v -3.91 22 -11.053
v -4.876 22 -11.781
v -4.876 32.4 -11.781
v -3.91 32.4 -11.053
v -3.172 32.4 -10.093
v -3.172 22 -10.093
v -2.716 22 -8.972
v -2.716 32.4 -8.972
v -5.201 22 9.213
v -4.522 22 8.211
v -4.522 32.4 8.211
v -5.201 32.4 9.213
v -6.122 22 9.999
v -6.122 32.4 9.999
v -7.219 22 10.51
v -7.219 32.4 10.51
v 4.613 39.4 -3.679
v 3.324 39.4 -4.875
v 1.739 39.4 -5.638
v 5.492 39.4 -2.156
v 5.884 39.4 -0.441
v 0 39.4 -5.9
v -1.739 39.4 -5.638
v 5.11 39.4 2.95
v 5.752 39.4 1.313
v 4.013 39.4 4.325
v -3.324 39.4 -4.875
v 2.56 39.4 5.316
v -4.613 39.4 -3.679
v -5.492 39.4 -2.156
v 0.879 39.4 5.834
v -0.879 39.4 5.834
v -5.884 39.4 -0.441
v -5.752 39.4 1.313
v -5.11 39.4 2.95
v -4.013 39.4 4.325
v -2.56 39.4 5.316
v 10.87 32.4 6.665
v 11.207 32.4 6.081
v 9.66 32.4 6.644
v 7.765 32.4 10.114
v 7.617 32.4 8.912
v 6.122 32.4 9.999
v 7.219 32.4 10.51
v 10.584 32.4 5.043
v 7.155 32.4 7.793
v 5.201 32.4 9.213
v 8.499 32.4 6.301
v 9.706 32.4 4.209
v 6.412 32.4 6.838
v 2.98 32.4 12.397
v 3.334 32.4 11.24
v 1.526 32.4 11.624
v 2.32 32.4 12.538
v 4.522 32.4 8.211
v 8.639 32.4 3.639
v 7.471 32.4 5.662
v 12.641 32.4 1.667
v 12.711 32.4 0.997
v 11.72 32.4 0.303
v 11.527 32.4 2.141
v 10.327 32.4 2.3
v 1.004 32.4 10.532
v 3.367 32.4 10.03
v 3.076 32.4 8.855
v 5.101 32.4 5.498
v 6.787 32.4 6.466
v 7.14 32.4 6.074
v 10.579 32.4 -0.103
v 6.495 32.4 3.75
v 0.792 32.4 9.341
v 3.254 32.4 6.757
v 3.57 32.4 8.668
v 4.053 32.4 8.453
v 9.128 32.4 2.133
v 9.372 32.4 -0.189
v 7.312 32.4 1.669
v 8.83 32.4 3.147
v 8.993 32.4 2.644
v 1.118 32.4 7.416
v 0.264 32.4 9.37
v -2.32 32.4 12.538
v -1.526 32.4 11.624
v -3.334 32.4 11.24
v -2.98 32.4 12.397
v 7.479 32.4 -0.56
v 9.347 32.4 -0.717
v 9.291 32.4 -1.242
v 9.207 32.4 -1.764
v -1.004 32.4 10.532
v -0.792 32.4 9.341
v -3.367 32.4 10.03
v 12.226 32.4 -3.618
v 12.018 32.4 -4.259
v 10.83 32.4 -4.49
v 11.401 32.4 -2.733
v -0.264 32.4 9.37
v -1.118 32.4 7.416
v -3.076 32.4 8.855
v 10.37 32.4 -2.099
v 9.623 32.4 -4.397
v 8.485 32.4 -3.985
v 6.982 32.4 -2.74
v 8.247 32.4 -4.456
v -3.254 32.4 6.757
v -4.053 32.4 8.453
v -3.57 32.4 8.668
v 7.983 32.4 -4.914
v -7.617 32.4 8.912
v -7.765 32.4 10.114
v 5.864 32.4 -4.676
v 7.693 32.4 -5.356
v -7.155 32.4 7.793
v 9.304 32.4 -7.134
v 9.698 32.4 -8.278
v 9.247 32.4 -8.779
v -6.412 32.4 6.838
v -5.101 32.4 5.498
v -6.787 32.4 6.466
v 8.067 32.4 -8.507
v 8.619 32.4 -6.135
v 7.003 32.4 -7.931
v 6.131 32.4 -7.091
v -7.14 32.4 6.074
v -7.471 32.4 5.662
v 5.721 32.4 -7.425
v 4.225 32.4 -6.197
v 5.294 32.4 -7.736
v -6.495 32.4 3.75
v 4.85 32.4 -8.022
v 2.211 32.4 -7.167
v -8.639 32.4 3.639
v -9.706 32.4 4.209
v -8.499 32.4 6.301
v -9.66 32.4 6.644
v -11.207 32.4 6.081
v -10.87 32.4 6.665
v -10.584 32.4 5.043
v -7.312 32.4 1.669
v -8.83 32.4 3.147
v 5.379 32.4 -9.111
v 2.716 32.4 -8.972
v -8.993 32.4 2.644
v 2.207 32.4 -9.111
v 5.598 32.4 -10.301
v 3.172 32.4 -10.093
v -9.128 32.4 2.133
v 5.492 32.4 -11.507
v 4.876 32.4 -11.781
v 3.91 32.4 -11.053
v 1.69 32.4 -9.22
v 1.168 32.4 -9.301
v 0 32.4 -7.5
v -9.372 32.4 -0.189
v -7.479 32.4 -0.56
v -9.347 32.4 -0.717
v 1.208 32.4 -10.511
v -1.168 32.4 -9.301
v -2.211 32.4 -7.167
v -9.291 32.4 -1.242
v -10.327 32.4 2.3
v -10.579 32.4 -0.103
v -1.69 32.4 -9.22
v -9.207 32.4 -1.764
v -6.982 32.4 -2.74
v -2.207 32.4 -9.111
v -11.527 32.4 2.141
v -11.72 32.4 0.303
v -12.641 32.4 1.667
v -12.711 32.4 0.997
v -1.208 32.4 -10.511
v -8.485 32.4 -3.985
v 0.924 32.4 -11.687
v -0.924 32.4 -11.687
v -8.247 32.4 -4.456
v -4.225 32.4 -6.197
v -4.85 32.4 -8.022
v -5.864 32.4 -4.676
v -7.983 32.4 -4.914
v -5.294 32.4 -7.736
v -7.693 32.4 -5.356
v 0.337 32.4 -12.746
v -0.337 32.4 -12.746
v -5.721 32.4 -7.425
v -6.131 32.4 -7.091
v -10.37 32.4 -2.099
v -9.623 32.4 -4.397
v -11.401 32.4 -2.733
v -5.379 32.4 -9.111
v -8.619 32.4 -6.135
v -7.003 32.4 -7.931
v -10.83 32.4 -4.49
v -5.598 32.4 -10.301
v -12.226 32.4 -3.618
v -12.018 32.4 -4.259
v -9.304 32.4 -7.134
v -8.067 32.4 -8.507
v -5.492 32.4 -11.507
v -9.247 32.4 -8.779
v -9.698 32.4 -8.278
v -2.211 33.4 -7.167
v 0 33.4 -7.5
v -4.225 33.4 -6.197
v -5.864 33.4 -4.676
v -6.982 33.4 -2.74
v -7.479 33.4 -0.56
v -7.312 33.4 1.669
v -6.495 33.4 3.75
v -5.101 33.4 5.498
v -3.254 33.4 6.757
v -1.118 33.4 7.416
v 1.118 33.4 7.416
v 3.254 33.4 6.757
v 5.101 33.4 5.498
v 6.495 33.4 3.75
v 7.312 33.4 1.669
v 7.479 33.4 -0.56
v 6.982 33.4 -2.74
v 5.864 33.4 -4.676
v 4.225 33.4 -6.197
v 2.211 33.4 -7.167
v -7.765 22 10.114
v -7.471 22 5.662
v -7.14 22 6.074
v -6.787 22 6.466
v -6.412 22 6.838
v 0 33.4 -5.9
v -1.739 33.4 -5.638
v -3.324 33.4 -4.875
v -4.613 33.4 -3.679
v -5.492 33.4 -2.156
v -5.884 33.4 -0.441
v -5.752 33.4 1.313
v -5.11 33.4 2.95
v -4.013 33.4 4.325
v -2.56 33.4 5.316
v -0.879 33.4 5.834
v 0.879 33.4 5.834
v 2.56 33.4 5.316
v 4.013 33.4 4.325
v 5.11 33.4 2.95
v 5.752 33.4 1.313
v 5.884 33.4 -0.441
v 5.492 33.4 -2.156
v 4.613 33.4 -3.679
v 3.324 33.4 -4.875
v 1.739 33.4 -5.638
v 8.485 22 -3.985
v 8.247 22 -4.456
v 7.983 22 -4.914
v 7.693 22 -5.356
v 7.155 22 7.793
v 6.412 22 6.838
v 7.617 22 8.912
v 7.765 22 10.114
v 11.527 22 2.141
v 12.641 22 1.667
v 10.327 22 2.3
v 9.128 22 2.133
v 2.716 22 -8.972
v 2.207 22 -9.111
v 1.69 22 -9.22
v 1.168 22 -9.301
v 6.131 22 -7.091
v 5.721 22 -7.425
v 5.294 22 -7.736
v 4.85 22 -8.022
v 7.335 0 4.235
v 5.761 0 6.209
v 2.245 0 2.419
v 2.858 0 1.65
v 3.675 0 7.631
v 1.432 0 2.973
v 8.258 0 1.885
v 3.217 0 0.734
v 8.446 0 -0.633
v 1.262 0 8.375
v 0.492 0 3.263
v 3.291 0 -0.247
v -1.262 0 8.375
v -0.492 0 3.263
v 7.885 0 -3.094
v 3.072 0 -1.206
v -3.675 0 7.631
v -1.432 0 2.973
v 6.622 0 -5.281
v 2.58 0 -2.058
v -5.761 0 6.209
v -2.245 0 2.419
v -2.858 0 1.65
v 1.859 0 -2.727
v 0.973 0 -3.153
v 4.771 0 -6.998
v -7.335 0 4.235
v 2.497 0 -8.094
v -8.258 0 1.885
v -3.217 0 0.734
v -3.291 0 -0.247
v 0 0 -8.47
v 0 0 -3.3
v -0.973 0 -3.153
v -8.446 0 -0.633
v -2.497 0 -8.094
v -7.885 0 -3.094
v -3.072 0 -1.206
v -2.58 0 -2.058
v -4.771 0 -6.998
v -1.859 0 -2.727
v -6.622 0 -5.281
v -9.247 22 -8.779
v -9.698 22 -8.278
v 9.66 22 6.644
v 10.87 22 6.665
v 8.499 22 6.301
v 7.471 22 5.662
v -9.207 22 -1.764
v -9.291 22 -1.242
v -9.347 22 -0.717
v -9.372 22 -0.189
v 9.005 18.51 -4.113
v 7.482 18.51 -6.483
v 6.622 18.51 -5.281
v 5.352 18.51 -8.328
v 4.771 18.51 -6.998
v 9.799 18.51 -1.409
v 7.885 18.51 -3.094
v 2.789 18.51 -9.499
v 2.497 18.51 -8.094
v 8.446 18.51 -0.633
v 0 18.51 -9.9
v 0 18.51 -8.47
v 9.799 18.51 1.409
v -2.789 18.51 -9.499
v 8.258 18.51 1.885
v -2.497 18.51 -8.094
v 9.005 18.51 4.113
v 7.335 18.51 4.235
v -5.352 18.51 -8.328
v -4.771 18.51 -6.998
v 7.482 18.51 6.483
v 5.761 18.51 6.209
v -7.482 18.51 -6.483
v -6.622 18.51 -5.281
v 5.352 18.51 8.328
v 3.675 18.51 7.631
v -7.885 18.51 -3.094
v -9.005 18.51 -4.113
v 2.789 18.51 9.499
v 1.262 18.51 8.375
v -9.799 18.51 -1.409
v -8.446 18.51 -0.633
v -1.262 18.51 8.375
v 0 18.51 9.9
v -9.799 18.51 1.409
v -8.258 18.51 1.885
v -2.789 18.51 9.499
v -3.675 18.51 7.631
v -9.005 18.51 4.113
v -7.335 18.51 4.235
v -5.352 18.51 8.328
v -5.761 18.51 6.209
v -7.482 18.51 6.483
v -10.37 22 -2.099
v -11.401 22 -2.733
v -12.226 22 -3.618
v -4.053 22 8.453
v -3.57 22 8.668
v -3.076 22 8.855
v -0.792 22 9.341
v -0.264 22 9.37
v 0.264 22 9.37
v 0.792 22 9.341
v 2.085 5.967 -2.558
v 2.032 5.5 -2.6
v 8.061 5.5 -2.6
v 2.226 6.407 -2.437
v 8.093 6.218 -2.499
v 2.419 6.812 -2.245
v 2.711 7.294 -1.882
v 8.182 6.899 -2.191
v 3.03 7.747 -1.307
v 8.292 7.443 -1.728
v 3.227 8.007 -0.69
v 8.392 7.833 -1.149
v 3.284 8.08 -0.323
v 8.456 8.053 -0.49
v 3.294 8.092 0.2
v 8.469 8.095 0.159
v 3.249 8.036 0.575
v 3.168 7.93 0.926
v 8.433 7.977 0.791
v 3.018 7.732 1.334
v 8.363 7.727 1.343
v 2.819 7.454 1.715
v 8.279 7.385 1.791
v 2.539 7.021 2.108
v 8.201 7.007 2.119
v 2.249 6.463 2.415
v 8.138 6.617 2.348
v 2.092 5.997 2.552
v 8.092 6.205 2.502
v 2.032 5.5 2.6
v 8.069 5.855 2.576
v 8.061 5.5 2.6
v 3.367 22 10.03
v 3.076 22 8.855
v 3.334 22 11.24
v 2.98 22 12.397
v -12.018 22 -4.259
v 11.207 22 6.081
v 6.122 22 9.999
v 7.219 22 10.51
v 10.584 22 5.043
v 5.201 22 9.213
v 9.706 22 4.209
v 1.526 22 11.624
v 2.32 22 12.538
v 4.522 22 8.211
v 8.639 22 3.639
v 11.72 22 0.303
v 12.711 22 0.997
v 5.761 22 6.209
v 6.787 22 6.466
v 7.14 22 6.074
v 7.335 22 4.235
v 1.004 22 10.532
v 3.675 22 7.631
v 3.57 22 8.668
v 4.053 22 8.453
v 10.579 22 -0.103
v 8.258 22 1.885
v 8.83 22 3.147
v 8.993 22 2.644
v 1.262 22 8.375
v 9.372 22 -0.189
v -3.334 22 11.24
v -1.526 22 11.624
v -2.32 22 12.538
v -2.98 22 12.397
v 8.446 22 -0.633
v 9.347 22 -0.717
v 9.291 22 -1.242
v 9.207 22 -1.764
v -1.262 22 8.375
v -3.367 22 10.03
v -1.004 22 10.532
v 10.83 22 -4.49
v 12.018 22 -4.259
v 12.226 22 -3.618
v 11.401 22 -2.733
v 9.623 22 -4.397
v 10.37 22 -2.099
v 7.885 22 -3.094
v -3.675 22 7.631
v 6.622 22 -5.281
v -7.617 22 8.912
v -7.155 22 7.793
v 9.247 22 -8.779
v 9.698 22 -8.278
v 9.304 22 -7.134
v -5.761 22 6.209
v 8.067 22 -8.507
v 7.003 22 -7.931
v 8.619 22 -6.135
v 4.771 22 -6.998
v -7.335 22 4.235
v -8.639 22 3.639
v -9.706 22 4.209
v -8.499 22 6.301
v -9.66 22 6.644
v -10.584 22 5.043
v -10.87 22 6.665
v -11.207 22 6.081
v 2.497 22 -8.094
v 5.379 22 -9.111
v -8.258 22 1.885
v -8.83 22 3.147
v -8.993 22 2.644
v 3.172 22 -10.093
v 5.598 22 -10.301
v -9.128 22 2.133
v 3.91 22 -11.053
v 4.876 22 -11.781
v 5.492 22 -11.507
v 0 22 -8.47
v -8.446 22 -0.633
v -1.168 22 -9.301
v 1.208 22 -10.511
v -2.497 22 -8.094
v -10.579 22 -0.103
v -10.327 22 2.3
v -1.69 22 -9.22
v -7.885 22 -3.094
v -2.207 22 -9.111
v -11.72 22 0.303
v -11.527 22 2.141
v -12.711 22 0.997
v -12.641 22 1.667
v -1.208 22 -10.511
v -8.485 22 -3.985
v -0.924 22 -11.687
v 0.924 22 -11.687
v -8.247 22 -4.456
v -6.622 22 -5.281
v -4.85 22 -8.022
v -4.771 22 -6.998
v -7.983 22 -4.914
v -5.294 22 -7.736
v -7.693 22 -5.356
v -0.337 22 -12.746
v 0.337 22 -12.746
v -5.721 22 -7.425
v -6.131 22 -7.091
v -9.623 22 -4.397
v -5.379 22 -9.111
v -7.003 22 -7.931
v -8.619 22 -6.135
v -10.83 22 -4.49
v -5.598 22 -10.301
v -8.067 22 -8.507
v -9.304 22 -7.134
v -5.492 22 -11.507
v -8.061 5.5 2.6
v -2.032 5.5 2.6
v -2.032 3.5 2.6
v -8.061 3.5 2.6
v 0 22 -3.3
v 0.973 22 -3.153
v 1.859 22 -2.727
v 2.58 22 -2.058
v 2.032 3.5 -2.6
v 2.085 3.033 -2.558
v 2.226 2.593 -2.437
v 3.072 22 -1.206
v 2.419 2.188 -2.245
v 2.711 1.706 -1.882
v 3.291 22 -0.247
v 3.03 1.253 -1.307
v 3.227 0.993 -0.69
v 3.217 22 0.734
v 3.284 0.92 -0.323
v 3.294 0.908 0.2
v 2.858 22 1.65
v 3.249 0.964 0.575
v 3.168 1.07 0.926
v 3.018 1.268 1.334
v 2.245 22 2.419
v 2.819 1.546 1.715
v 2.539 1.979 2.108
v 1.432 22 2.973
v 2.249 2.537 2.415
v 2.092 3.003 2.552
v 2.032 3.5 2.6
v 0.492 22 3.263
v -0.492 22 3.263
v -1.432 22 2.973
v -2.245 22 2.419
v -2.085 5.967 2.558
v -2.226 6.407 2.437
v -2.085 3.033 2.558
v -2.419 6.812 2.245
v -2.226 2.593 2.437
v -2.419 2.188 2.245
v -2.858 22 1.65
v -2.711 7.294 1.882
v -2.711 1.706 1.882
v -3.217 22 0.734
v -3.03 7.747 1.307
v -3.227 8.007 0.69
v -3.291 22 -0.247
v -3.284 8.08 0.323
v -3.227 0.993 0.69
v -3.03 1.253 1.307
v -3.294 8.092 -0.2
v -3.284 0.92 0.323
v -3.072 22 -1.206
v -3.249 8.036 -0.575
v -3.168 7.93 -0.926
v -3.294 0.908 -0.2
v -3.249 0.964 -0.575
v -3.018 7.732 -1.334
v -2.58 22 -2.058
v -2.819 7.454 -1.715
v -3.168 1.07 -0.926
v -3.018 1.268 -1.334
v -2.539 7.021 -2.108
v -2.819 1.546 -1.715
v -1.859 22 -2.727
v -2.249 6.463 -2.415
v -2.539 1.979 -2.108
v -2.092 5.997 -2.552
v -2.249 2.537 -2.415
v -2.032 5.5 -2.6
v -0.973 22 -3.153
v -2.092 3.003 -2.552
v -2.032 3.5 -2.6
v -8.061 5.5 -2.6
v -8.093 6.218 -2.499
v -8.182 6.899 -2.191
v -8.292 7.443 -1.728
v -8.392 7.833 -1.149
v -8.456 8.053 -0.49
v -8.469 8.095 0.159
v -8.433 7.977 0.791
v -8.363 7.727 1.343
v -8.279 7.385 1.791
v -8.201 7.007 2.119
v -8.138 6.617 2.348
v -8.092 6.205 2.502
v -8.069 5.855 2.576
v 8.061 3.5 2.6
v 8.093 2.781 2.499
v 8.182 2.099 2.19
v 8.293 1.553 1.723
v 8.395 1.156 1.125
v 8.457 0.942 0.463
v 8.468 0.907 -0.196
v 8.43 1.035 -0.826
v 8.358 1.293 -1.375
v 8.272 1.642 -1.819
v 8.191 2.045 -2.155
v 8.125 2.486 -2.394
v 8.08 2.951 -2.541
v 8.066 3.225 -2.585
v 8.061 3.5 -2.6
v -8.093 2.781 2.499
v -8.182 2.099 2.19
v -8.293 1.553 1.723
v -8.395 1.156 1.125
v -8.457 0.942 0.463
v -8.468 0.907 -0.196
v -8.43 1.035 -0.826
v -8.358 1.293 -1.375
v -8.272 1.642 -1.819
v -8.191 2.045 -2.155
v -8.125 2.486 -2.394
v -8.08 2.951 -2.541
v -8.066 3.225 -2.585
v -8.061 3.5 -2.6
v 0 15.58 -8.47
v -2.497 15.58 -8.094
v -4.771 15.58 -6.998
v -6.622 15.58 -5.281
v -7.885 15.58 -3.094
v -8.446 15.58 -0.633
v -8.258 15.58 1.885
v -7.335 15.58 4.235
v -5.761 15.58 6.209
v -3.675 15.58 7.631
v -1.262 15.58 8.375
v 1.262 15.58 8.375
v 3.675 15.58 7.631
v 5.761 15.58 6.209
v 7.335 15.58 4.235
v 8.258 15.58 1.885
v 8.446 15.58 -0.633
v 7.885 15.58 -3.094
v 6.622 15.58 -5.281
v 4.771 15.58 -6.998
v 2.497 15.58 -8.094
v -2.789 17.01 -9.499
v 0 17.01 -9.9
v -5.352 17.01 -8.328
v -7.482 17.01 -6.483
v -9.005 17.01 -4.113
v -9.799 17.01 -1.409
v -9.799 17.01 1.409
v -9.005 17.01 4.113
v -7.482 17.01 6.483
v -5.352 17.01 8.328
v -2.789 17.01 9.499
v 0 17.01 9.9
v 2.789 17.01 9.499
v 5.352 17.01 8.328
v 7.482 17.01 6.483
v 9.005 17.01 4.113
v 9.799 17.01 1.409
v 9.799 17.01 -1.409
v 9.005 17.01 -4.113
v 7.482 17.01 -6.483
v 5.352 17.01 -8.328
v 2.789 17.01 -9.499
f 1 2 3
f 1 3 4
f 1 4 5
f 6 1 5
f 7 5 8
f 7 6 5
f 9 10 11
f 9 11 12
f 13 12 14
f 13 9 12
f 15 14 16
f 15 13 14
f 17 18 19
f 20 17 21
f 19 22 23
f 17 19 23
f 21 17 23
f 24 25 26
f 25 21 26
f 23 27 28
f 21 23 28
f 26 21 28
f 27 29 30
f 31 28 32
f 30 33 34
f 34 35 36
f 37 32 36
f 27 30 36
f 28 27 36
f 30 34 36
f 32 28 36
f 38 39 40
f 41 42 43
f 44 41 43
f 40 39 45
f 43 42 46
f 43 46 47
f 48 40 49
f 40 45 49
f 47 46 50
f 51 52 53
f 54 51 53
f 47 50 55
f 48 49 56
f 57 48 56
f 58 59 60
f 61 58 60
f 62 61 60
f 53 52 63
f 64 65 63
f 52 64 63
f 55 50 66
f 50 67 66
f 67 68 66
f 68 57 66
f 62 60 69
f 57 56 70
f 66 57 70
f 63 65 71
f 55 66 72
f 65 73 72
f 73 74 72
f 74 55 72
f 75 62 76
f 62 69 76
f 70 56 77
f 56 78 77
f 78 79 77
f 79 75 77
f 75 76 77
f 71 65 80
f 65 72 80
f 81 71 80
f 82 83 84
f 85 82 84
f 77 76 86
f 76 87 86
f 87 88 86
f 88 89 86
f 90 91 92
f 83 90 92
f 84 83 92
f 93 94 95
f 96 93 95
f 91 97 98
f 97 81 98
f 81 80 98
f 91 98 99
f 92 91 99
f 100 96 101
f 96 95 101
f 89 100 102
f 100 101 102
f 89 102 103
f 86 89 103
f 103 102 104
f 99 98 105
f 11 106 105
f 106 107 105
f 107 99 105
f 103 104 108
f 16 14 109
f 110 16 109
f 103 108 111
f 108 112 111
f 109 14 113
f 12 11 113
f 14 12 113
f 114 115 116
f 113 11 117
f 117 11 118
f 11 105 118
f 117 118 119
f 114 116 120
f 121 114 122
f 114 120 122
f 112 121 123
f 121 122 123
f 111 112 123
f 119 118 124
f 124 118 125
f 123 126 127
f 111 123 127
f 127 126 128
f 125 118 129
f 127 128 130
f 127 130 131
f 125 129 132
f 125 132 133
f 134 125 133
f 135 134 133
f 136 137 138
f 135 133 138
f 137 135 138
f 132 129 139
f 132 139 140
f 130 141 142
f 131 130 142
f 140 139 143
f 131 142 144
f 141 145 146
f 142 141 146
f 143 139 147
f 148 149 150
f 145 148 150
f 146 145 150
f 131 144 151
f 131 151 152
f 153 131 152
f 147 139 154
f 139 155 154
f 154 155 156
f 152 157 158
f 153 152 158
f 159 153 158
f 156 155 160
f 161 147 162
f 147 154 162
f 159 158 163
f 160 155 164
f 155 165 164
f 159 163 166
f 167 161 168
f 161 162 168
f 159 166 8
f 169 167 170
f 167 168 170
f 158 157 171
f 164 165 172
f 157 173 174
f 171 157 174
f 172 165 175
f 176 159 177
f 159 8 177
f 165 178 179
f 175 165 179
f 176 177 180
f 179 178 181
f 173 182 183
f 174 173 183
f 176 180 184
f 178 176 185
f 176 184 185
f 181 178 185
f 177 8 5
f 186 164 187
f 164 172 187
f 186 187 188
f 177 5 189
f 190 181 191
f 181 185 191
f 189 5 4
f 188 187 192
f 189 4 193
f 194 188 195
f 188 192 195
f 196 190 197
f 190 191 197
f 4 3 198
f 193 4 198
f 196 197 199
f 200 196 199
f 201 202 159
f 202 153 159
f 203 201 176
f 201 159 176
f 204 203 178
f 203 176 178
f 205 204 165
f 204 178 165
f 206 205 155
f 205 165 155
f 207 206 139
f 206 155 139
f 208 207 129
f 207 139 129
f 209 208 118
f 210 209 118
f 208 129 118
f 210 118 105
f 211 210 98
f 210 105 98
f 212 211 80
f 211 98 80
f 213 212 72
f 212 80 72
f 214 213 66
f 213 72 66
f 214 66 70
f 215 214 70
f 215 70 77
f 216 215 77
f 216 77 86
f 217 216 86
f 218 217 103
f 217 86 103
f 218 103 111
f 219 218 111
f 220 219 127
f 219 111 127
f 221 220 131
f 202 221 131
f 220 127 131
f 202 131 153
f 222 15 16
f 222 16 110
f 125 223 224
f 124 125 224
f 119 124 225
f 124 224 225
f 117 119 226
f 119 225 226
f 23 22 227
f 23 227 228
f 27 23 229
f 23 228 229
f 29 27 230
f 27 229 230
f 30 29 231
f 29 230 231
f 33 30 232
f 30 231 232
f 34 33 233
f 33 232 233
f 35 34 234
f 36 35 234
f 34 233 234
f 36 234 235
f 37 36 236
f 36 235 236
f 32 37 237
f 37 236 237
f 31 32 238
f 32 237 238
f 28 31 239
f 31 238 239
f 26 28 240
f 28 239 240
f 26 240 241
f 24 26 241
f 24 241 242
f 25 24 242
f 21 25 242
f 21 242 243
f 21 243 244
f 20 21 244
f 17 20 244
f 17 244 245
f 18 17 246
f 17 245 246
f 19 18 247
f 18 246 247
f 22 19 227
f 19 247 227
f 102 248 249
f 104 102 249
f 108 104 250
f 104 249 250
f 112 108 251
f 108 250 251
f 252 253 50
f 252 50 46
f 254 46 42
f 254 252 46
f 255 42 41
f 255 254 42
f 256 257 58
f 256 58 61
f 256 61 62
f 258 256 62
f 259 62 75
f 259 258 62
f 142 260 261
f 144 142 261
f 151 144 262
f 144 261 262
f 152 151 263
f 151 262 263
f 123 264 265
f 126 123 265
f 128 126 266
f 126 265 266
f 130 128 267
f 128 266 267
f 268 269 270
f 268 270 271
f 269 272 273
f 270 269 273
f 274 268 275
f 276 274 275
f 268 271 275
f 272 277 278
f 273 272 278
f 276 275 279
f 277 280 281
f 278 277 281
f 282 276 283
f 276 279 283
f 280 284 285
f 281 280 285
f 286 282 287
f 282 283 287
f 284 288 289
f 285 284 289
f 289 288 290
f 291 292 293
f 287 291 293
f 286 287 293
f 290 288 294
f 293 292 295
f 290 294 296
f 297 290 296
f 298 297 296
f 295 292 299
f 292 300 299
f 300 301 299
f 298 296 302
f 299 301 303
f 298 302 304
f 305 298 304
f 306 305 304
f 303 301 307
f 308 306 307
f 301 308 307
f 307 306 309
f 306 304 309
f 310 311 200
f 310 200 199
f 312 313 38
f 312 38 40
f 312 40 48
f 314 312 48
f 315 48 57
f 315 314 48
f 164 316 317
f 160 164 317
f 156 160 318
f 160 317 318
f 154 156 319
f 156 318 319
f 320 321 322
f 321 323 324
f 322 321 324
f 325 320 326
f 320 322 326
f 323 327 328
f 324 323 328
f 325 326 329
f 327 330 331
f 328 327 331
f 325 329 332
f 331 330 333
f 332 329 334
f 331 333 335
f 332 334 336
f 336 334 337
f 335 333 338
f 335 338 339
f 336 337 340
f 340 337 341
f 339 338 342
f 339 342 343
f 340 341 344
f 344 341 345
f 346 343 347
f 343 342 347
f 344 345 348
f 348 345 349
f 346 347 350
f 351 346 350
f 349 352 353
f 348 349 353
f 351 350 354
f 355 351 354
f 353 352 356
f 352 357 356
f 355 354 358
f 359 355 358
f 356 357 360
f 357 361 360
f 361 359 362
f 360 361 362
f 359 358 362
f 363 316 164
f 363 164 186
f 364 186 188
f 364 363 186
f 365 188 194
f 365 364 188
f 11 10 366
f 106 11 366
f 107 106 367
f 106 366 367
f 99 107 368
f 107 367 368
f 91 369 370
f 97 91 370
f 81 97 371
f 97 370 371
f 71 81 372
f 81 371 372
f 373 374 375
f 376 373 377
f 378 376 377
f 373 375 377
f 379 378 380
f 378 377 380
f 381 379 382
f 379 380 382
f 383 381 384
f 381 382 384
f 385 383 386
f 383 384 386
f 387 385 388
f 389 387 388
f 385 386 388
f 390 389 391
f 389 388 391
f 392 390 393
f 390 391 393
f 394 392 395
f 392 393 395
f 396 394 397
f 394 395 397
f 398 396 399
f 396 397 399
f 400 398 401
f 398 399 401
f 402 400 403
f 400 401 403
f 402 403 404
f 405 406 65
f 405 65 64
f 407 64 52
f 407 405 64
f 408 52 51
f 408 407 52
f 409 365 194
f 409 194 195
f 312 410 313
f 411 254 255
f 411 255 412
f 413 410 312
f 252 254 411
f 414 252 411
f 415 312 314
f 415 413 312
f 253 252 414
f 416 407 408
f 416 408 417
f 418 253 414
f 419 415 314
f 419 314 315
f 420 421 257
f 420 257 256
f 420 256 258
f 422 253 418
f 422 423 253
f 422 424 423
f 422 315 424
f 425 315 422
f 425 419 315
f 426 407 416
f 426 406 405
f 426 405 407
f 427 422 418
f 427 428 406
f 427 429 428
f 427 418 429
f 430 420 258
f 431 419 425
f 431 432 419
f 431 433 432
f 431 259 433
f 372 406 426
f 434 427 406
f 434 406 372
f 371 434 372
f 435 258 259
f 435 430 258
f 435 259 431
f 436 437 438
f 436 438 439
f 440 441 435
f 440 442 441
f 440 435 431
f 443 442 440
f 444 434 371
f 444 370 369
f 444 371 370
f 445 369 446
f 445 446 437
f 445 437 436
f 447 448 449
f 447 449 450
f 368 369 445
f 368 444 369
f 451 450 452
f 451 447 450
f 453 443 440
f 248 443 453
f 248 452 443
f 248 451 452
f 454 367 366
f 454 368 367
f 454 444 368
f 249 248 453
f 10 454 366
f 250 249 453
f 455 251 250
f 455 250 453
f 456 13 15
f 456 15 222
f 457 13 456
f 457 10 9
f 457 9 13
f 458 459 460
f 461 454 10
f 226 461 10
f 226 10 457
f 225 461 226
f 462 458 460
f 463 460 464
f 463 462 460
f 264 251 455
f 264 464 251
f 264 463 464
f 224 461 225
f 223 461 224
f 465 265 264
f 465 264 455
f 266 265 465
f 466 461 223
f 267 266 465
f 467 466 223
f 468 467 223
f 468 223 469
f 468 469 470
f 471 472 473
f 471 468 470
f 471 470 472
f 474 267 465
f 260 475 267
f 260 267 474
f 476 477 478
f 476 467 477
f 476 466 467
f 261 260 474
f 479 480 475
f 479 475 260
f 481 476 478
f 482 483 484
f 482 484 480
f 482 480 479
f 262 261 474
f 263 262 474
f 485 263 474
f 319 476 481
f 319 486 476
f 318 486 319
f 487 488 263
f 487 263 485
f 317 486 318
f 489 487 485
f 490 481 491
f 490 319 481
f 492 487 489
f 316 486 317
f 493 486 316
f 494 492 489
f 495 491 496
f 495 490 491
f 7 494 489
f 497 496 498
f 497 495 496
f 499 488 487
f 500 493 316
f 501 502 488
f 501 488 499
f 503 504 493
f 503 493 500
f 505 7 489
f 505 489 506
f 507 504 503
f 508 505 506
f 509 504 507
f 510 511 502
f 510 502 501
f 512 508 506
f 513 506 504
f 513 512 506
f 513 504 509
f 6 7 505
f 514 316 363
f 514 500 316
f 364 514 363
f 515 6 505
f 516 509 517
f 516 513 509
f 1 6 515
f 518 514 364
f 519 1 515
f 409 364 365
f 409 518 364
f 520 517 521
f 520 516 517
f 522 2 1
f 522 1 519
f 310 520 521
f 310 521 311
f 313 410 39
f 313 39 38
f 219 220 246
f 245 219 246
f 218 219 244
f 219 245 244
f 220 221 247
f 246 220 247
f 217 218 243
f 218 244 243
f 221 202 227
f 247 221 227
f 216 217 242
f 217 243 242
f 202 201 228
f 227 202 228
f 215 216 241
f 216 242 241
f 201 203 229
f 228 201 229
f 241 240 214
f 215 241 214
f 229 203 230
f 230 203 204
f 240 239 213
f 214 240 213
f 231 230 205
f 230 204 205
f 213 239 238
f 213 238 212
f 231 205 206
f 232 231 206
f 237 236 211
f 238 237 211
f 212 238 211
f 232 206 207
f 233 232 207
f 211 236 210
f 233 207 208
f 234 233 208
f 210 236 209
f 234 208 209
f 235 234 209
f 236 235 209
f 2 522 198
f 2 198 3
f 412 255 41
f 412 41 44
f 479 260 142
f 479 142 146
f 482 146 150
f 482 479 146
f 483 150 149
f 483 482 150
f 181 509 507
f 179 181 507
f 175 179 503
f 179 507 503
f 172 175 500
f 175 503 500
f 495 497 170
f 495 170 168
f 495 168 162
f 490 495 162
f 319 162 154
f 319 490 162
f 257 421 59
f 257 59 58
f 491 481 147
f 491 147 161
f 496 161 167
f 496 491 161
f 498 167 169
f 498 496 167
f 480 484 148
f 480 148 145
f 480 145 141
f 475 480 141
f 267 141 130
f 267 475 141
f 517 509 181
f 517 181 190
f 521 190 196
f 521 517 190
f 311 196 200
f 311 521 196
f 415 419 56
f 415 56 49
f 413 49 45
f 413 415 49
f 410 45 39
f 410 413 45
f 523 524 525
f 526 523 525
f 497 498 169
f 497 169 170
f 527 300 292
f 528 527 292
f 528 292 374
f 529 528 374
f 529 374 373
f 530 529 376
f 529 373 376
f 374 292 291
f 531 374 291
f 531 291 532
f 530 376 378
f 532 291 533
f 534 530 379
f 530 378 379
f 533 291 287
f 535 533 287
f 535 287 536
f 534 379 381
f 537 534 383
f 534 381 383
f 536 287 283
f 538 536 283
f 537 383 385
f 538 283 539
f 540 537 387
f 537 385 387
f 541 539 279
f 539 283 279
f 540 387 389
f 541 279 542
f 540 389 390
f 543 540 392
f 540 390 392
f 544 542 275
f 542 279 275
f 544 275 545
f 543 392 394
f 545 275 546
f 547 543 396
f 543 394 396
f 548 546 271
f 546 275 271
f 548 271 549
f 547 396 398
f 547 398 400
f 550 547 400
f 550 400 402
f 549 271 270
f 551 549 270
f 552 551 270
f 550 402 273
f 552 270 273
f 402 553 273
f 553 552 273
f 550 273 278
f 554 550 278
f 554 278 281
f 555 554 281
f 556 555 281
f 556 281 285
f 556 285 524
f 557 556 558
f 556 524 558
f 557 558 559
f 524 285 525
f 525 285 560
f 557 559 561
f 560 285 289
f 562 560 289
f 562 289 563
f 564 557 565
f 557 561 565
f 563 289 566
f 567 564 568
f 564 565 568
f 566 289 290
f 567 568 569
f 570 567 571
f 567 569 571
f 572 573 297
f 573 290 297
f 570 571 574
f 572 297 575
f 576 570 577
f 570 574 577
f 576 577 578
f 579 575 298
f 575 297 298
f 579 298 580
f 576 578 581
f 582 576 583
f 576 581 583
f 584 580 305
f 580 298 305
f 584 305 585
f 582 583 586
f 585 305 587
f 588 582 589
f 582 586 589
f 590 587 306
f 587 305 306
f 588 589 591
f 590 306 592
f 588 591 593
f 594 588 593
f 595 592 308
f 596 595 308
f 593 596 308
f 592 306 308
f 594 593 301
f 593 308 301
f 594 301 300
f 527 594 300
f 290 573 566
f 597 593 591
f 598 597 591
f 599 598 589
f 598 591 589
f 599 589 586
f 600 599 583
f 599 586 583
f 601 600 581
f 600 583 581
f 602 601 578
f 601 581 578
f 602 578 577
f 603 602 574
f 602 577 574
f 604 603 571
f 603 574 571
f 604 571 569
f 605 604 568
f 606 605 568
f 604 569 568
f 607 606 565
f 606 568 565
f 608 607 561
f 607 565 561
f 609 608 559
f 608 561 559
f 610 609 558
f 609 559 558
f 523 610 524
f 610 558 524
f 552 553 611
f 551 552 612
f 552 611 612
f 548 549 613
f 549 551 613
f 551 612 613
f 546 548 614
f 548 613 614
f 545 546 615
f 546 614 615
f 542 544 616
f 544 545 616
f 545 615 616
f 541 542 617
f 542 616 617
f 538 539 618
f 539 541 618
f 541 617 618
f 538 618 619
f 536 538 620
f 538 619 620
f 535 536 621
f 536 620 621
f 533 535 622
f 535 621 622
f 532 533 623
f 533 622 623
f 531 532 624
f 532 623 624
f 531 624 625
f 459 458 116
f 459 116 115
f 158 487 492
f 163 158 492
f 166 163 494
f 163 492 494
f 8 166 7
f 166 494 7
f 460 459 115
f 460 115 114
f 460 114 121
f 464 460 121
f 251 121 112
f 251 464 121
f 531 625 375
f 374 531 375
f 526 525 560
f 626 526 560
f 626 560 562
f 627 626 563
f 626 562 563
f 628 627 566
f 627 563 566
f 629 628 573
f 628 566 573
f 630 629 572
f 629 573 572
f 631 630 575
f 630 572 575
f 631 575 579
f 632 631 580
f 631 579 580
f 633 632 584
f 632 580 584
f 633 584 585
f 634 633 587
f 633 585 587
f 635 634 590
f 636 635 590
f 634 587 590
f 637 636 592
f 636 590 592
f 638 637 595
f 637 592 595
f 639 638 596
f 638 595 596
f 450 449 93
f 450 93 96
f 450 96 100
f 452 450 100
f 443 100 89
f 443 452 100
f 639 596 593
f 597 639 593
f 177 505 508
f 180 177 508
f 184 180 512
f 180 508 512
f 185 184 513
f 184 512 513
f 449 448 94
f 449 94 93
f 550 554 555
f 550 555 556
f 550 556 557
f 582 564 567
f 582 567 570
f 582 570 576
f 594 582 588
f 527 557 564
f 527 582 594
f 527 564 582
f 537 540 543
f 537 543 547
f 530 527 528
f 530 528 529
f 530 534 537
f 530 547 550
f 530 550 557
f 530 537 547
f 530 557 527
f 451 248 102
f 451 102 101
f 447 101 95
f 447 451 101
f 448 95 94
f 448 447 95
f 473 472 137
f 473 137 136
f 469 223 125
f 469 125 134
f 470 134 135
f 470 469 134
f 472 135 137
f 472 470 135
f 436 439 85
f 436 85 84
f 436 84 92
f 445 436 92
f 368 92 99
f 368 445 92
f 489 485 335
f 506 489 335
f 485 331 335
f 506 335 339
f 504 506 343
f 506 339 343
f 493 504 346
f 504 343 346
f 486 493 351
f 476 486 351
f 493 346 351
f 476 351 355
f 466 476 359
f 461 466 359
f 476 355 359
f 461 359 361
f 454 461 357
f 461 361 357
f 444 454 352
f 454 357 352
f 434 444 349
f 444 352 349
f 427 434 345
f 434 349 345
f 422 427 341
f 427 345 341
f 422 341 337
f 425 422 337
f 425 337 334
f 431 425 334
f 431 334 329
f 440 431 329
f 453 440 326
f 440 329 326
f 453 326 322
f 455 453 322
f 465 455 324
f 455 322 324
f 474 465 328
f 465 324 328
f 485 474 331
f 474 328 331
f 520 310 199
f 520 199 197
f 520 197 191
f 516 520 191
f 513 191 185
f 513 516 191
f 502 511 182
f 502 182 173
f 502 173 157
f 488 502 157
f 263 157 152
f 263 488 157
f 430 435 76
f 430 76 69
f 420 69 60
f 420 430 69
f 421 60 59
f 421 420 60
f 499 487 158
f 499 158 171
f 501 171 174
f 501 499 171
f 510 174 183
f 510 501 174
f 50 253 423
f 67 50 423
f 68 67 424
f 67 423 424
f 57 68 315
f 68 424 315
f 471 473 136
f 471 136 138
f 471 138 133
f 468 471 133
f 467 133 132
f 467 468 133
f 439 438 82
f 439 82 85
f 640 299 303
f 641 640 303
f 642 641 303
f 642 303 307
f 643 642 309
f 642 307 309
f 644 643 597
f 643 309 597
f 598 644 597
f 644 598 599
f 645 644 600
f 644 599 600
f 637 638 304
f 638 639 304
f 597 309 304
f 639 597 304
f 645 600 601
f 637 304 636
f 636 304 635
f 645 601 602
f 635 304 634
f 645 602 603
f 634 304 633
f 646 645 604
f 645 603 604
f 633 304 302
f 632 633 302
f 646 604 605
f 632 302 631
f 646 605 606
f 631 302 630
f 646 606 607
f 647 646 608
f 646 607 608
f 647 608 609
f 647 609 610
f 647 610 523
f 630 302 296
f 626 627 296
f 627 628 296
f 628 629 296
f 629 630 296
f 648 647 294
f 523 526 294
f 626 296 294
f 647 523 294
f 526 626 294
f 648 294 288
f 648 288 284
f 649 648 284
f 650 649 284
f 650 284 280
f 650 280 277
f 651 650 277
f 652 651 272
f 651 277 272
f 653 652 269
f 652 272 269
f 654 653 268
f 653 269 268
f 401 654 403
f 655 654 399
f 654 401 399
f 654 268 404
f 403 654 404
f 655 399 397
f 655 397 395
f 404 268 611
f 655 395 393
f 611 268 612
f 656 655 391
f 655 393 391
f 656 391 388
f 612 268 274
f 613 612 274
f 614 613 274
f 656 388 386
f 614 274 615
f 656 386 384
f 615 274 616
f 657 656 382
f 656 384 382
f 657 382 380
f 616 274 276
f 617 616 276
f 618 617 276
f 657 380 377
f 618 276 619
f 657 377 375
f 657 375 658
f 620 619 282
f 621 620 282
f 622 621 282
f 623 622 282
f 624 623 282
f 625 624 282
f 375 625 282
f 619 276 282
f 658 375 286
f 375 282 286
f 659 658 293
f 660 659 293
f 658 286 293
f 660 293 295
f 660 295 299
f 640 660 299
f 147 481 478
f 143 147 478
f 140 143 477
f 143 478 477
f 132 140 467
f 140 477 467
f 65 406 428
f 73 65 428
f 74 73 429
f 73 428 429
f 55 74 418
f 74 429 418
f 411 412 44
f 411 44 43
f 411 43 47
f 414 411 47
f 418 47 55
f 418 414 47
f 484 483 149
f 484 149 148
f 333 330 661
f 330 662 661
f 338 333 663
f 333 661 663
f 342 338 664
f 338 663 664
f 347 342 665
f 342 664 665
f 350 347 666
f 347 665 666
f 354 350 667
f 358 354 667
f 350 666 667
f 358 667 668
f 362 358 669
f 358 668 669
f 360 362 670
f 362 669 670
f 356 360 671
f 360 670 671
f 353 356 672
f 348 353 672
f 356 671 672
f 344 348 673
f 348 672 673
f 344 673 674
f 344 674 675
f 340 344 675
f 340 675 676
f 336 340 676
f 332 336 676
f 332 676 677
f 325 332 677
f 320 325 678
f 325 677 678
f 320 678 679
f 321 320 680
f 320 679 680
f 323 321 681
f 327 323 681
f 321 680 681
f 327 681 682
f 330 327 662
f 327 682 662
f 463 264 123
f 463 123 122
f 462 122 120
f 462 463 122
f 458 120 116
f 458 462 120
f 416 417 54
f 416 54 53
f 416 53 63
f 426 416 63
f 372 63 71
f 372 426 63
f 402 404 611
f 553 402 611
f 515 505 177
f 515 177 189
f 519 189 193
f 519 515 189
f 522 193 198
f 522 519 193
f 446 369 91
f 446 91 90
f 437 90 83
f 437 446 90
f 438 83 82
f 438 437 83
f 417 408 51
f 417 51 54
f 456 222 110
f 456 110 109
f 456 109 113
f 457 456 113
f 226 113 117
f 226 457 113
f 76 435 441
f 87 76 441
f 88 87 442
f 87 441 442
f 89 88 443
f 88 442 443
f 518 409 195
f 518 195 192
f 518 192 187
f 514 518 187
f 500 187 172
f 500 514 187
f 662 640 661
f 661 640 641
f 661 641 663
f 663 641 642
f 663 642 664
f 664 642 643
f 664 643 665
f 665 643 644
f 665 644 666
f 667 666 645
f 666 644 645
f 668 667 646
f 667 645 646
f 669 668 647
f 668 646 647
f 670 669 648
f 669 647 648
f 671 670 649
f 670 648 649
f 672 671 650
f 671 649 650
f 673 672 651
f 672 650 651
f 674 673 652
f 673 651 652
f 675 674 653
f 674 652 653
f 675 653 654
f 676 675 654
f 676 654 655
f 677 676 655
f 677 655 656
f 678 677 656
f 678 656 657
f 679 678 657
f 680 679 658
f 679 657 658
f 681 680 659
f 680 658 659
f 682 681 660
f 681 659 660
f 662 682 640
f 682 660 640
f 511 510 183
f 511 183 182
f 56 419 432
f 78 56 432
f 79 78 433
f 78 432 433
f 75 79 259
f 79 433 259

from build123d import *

# Parameters (mm, degrees)
RESSALTO_EXTRUS_O1_START = -10.4
RESSALTO_EXTRUS_O1_DEPTH = 10.4
PADR_OCIRCULAR1_COUNT    = 15
ESBO_O3_R                = 3.3
CORTE_EXTRUS_O1_DEPTH    = 22
CORTE_EXTRUS_O4_DEPTH    = 20


with BuildPart() as part:
    # Esboço1 → Revolução1 (revolve)
    with BuildSketch(Plane.XY, mode=Mode.PRIVATE) as revolu_o1_sk:
        Polygon((0, 0), (0, 39.4), (5.9, 39.4), (5.9, 33.4), (7.5, 33.4), (7.5, 32.4), (9.374, 32.4), (9.374, 22), (8.47, 22), (8.47, 18.51), (9.9, 18.51), (9.9, 17.01), (8.47, 15.58), (8.47, 0), align=None)
    revolve(revolu_o1_sk.sketch.rotate(Axis((0, 0, 0), (0, 1, 0)), 90), axis=Axis((0, 0, 0), (0, 1, 0)))

    # Esboço2 → Ressalto-extrusão1 (add)
    with BuildSketch(Plane(origin=(0, 32.4, 0), x_dir=(1, 0, 0), z_dir=(0, 1, 0)).offset(RESSALTO_EXTRUS_O1_START)):
        with BuildLine():
            Line((-0.337, 12.746), (0.337, 12.746))
            ThreePointArc((0.337, 12.746), (1.105703178, 11.108702403), (1.167644885, 9.300993572))
            ThreePointArc((1.167644885, 9.300993572), (0, 9.374), (-1.167644885, 9.300993572))
            ThreePointArc((-1.167644885, 9.300993572), (-1.105703178, 11.108702403), (-0.337, 12.746))
        make_face()
    ressalto_extrus_o1 = extrude(amount=RESSALTO_EXTRUS_O1_DEPTH)

    # PadrãoCircular1: Ressalto-extrusão1 ×15 about axis
    padr_ocircular1_axis = Axis((0, 0, 0), (0, 1, 0))
    for i in range(1, PADR_OCIRCULAR1_COUNT):
        add(ressalto_extrus_o1.rotate(padr_ocircular1_axis, i * 360 / PADR_OCIRCULAR1_COUNT))

    # Esboço3 → Corte-extrusão1 (cut)
    with BuildSketch(Plane.XZ):
        with Locations(Location((0, 0, 0), (0, 0, 270))):
            Circle(ESBO_O3_R)
    extrude(amount=-CORTE_EXTRUS_O1_DEPTH, mode=Mode.SUBTRACT)

    # Esboço7 → Corte-extrusão4 (cut, symmetric)
    with BuildSketch(Plane(origin=(0, 0, 0), x_dir=(0, 0, -1), z_dir=(1, 0, 0))):
        with BuildLine():
            Line((-2.6, 5.5), (-2.6, 3.5))
            ThreePointArc((-2.6, 3.5), (0, 0.9), (2.6, 3.5))
            Line((2.6, 3.5), (2.6, 5.5))
            ThreePointArc((2.6, 5.5), (0, 8.1), (-2.6, 5.5))
        make_face()
    extrude(amount=CORTE_EXTRUS_O4_DEPTH, both=True, mode=Mode.SUBTRACT)


solid = part.part
